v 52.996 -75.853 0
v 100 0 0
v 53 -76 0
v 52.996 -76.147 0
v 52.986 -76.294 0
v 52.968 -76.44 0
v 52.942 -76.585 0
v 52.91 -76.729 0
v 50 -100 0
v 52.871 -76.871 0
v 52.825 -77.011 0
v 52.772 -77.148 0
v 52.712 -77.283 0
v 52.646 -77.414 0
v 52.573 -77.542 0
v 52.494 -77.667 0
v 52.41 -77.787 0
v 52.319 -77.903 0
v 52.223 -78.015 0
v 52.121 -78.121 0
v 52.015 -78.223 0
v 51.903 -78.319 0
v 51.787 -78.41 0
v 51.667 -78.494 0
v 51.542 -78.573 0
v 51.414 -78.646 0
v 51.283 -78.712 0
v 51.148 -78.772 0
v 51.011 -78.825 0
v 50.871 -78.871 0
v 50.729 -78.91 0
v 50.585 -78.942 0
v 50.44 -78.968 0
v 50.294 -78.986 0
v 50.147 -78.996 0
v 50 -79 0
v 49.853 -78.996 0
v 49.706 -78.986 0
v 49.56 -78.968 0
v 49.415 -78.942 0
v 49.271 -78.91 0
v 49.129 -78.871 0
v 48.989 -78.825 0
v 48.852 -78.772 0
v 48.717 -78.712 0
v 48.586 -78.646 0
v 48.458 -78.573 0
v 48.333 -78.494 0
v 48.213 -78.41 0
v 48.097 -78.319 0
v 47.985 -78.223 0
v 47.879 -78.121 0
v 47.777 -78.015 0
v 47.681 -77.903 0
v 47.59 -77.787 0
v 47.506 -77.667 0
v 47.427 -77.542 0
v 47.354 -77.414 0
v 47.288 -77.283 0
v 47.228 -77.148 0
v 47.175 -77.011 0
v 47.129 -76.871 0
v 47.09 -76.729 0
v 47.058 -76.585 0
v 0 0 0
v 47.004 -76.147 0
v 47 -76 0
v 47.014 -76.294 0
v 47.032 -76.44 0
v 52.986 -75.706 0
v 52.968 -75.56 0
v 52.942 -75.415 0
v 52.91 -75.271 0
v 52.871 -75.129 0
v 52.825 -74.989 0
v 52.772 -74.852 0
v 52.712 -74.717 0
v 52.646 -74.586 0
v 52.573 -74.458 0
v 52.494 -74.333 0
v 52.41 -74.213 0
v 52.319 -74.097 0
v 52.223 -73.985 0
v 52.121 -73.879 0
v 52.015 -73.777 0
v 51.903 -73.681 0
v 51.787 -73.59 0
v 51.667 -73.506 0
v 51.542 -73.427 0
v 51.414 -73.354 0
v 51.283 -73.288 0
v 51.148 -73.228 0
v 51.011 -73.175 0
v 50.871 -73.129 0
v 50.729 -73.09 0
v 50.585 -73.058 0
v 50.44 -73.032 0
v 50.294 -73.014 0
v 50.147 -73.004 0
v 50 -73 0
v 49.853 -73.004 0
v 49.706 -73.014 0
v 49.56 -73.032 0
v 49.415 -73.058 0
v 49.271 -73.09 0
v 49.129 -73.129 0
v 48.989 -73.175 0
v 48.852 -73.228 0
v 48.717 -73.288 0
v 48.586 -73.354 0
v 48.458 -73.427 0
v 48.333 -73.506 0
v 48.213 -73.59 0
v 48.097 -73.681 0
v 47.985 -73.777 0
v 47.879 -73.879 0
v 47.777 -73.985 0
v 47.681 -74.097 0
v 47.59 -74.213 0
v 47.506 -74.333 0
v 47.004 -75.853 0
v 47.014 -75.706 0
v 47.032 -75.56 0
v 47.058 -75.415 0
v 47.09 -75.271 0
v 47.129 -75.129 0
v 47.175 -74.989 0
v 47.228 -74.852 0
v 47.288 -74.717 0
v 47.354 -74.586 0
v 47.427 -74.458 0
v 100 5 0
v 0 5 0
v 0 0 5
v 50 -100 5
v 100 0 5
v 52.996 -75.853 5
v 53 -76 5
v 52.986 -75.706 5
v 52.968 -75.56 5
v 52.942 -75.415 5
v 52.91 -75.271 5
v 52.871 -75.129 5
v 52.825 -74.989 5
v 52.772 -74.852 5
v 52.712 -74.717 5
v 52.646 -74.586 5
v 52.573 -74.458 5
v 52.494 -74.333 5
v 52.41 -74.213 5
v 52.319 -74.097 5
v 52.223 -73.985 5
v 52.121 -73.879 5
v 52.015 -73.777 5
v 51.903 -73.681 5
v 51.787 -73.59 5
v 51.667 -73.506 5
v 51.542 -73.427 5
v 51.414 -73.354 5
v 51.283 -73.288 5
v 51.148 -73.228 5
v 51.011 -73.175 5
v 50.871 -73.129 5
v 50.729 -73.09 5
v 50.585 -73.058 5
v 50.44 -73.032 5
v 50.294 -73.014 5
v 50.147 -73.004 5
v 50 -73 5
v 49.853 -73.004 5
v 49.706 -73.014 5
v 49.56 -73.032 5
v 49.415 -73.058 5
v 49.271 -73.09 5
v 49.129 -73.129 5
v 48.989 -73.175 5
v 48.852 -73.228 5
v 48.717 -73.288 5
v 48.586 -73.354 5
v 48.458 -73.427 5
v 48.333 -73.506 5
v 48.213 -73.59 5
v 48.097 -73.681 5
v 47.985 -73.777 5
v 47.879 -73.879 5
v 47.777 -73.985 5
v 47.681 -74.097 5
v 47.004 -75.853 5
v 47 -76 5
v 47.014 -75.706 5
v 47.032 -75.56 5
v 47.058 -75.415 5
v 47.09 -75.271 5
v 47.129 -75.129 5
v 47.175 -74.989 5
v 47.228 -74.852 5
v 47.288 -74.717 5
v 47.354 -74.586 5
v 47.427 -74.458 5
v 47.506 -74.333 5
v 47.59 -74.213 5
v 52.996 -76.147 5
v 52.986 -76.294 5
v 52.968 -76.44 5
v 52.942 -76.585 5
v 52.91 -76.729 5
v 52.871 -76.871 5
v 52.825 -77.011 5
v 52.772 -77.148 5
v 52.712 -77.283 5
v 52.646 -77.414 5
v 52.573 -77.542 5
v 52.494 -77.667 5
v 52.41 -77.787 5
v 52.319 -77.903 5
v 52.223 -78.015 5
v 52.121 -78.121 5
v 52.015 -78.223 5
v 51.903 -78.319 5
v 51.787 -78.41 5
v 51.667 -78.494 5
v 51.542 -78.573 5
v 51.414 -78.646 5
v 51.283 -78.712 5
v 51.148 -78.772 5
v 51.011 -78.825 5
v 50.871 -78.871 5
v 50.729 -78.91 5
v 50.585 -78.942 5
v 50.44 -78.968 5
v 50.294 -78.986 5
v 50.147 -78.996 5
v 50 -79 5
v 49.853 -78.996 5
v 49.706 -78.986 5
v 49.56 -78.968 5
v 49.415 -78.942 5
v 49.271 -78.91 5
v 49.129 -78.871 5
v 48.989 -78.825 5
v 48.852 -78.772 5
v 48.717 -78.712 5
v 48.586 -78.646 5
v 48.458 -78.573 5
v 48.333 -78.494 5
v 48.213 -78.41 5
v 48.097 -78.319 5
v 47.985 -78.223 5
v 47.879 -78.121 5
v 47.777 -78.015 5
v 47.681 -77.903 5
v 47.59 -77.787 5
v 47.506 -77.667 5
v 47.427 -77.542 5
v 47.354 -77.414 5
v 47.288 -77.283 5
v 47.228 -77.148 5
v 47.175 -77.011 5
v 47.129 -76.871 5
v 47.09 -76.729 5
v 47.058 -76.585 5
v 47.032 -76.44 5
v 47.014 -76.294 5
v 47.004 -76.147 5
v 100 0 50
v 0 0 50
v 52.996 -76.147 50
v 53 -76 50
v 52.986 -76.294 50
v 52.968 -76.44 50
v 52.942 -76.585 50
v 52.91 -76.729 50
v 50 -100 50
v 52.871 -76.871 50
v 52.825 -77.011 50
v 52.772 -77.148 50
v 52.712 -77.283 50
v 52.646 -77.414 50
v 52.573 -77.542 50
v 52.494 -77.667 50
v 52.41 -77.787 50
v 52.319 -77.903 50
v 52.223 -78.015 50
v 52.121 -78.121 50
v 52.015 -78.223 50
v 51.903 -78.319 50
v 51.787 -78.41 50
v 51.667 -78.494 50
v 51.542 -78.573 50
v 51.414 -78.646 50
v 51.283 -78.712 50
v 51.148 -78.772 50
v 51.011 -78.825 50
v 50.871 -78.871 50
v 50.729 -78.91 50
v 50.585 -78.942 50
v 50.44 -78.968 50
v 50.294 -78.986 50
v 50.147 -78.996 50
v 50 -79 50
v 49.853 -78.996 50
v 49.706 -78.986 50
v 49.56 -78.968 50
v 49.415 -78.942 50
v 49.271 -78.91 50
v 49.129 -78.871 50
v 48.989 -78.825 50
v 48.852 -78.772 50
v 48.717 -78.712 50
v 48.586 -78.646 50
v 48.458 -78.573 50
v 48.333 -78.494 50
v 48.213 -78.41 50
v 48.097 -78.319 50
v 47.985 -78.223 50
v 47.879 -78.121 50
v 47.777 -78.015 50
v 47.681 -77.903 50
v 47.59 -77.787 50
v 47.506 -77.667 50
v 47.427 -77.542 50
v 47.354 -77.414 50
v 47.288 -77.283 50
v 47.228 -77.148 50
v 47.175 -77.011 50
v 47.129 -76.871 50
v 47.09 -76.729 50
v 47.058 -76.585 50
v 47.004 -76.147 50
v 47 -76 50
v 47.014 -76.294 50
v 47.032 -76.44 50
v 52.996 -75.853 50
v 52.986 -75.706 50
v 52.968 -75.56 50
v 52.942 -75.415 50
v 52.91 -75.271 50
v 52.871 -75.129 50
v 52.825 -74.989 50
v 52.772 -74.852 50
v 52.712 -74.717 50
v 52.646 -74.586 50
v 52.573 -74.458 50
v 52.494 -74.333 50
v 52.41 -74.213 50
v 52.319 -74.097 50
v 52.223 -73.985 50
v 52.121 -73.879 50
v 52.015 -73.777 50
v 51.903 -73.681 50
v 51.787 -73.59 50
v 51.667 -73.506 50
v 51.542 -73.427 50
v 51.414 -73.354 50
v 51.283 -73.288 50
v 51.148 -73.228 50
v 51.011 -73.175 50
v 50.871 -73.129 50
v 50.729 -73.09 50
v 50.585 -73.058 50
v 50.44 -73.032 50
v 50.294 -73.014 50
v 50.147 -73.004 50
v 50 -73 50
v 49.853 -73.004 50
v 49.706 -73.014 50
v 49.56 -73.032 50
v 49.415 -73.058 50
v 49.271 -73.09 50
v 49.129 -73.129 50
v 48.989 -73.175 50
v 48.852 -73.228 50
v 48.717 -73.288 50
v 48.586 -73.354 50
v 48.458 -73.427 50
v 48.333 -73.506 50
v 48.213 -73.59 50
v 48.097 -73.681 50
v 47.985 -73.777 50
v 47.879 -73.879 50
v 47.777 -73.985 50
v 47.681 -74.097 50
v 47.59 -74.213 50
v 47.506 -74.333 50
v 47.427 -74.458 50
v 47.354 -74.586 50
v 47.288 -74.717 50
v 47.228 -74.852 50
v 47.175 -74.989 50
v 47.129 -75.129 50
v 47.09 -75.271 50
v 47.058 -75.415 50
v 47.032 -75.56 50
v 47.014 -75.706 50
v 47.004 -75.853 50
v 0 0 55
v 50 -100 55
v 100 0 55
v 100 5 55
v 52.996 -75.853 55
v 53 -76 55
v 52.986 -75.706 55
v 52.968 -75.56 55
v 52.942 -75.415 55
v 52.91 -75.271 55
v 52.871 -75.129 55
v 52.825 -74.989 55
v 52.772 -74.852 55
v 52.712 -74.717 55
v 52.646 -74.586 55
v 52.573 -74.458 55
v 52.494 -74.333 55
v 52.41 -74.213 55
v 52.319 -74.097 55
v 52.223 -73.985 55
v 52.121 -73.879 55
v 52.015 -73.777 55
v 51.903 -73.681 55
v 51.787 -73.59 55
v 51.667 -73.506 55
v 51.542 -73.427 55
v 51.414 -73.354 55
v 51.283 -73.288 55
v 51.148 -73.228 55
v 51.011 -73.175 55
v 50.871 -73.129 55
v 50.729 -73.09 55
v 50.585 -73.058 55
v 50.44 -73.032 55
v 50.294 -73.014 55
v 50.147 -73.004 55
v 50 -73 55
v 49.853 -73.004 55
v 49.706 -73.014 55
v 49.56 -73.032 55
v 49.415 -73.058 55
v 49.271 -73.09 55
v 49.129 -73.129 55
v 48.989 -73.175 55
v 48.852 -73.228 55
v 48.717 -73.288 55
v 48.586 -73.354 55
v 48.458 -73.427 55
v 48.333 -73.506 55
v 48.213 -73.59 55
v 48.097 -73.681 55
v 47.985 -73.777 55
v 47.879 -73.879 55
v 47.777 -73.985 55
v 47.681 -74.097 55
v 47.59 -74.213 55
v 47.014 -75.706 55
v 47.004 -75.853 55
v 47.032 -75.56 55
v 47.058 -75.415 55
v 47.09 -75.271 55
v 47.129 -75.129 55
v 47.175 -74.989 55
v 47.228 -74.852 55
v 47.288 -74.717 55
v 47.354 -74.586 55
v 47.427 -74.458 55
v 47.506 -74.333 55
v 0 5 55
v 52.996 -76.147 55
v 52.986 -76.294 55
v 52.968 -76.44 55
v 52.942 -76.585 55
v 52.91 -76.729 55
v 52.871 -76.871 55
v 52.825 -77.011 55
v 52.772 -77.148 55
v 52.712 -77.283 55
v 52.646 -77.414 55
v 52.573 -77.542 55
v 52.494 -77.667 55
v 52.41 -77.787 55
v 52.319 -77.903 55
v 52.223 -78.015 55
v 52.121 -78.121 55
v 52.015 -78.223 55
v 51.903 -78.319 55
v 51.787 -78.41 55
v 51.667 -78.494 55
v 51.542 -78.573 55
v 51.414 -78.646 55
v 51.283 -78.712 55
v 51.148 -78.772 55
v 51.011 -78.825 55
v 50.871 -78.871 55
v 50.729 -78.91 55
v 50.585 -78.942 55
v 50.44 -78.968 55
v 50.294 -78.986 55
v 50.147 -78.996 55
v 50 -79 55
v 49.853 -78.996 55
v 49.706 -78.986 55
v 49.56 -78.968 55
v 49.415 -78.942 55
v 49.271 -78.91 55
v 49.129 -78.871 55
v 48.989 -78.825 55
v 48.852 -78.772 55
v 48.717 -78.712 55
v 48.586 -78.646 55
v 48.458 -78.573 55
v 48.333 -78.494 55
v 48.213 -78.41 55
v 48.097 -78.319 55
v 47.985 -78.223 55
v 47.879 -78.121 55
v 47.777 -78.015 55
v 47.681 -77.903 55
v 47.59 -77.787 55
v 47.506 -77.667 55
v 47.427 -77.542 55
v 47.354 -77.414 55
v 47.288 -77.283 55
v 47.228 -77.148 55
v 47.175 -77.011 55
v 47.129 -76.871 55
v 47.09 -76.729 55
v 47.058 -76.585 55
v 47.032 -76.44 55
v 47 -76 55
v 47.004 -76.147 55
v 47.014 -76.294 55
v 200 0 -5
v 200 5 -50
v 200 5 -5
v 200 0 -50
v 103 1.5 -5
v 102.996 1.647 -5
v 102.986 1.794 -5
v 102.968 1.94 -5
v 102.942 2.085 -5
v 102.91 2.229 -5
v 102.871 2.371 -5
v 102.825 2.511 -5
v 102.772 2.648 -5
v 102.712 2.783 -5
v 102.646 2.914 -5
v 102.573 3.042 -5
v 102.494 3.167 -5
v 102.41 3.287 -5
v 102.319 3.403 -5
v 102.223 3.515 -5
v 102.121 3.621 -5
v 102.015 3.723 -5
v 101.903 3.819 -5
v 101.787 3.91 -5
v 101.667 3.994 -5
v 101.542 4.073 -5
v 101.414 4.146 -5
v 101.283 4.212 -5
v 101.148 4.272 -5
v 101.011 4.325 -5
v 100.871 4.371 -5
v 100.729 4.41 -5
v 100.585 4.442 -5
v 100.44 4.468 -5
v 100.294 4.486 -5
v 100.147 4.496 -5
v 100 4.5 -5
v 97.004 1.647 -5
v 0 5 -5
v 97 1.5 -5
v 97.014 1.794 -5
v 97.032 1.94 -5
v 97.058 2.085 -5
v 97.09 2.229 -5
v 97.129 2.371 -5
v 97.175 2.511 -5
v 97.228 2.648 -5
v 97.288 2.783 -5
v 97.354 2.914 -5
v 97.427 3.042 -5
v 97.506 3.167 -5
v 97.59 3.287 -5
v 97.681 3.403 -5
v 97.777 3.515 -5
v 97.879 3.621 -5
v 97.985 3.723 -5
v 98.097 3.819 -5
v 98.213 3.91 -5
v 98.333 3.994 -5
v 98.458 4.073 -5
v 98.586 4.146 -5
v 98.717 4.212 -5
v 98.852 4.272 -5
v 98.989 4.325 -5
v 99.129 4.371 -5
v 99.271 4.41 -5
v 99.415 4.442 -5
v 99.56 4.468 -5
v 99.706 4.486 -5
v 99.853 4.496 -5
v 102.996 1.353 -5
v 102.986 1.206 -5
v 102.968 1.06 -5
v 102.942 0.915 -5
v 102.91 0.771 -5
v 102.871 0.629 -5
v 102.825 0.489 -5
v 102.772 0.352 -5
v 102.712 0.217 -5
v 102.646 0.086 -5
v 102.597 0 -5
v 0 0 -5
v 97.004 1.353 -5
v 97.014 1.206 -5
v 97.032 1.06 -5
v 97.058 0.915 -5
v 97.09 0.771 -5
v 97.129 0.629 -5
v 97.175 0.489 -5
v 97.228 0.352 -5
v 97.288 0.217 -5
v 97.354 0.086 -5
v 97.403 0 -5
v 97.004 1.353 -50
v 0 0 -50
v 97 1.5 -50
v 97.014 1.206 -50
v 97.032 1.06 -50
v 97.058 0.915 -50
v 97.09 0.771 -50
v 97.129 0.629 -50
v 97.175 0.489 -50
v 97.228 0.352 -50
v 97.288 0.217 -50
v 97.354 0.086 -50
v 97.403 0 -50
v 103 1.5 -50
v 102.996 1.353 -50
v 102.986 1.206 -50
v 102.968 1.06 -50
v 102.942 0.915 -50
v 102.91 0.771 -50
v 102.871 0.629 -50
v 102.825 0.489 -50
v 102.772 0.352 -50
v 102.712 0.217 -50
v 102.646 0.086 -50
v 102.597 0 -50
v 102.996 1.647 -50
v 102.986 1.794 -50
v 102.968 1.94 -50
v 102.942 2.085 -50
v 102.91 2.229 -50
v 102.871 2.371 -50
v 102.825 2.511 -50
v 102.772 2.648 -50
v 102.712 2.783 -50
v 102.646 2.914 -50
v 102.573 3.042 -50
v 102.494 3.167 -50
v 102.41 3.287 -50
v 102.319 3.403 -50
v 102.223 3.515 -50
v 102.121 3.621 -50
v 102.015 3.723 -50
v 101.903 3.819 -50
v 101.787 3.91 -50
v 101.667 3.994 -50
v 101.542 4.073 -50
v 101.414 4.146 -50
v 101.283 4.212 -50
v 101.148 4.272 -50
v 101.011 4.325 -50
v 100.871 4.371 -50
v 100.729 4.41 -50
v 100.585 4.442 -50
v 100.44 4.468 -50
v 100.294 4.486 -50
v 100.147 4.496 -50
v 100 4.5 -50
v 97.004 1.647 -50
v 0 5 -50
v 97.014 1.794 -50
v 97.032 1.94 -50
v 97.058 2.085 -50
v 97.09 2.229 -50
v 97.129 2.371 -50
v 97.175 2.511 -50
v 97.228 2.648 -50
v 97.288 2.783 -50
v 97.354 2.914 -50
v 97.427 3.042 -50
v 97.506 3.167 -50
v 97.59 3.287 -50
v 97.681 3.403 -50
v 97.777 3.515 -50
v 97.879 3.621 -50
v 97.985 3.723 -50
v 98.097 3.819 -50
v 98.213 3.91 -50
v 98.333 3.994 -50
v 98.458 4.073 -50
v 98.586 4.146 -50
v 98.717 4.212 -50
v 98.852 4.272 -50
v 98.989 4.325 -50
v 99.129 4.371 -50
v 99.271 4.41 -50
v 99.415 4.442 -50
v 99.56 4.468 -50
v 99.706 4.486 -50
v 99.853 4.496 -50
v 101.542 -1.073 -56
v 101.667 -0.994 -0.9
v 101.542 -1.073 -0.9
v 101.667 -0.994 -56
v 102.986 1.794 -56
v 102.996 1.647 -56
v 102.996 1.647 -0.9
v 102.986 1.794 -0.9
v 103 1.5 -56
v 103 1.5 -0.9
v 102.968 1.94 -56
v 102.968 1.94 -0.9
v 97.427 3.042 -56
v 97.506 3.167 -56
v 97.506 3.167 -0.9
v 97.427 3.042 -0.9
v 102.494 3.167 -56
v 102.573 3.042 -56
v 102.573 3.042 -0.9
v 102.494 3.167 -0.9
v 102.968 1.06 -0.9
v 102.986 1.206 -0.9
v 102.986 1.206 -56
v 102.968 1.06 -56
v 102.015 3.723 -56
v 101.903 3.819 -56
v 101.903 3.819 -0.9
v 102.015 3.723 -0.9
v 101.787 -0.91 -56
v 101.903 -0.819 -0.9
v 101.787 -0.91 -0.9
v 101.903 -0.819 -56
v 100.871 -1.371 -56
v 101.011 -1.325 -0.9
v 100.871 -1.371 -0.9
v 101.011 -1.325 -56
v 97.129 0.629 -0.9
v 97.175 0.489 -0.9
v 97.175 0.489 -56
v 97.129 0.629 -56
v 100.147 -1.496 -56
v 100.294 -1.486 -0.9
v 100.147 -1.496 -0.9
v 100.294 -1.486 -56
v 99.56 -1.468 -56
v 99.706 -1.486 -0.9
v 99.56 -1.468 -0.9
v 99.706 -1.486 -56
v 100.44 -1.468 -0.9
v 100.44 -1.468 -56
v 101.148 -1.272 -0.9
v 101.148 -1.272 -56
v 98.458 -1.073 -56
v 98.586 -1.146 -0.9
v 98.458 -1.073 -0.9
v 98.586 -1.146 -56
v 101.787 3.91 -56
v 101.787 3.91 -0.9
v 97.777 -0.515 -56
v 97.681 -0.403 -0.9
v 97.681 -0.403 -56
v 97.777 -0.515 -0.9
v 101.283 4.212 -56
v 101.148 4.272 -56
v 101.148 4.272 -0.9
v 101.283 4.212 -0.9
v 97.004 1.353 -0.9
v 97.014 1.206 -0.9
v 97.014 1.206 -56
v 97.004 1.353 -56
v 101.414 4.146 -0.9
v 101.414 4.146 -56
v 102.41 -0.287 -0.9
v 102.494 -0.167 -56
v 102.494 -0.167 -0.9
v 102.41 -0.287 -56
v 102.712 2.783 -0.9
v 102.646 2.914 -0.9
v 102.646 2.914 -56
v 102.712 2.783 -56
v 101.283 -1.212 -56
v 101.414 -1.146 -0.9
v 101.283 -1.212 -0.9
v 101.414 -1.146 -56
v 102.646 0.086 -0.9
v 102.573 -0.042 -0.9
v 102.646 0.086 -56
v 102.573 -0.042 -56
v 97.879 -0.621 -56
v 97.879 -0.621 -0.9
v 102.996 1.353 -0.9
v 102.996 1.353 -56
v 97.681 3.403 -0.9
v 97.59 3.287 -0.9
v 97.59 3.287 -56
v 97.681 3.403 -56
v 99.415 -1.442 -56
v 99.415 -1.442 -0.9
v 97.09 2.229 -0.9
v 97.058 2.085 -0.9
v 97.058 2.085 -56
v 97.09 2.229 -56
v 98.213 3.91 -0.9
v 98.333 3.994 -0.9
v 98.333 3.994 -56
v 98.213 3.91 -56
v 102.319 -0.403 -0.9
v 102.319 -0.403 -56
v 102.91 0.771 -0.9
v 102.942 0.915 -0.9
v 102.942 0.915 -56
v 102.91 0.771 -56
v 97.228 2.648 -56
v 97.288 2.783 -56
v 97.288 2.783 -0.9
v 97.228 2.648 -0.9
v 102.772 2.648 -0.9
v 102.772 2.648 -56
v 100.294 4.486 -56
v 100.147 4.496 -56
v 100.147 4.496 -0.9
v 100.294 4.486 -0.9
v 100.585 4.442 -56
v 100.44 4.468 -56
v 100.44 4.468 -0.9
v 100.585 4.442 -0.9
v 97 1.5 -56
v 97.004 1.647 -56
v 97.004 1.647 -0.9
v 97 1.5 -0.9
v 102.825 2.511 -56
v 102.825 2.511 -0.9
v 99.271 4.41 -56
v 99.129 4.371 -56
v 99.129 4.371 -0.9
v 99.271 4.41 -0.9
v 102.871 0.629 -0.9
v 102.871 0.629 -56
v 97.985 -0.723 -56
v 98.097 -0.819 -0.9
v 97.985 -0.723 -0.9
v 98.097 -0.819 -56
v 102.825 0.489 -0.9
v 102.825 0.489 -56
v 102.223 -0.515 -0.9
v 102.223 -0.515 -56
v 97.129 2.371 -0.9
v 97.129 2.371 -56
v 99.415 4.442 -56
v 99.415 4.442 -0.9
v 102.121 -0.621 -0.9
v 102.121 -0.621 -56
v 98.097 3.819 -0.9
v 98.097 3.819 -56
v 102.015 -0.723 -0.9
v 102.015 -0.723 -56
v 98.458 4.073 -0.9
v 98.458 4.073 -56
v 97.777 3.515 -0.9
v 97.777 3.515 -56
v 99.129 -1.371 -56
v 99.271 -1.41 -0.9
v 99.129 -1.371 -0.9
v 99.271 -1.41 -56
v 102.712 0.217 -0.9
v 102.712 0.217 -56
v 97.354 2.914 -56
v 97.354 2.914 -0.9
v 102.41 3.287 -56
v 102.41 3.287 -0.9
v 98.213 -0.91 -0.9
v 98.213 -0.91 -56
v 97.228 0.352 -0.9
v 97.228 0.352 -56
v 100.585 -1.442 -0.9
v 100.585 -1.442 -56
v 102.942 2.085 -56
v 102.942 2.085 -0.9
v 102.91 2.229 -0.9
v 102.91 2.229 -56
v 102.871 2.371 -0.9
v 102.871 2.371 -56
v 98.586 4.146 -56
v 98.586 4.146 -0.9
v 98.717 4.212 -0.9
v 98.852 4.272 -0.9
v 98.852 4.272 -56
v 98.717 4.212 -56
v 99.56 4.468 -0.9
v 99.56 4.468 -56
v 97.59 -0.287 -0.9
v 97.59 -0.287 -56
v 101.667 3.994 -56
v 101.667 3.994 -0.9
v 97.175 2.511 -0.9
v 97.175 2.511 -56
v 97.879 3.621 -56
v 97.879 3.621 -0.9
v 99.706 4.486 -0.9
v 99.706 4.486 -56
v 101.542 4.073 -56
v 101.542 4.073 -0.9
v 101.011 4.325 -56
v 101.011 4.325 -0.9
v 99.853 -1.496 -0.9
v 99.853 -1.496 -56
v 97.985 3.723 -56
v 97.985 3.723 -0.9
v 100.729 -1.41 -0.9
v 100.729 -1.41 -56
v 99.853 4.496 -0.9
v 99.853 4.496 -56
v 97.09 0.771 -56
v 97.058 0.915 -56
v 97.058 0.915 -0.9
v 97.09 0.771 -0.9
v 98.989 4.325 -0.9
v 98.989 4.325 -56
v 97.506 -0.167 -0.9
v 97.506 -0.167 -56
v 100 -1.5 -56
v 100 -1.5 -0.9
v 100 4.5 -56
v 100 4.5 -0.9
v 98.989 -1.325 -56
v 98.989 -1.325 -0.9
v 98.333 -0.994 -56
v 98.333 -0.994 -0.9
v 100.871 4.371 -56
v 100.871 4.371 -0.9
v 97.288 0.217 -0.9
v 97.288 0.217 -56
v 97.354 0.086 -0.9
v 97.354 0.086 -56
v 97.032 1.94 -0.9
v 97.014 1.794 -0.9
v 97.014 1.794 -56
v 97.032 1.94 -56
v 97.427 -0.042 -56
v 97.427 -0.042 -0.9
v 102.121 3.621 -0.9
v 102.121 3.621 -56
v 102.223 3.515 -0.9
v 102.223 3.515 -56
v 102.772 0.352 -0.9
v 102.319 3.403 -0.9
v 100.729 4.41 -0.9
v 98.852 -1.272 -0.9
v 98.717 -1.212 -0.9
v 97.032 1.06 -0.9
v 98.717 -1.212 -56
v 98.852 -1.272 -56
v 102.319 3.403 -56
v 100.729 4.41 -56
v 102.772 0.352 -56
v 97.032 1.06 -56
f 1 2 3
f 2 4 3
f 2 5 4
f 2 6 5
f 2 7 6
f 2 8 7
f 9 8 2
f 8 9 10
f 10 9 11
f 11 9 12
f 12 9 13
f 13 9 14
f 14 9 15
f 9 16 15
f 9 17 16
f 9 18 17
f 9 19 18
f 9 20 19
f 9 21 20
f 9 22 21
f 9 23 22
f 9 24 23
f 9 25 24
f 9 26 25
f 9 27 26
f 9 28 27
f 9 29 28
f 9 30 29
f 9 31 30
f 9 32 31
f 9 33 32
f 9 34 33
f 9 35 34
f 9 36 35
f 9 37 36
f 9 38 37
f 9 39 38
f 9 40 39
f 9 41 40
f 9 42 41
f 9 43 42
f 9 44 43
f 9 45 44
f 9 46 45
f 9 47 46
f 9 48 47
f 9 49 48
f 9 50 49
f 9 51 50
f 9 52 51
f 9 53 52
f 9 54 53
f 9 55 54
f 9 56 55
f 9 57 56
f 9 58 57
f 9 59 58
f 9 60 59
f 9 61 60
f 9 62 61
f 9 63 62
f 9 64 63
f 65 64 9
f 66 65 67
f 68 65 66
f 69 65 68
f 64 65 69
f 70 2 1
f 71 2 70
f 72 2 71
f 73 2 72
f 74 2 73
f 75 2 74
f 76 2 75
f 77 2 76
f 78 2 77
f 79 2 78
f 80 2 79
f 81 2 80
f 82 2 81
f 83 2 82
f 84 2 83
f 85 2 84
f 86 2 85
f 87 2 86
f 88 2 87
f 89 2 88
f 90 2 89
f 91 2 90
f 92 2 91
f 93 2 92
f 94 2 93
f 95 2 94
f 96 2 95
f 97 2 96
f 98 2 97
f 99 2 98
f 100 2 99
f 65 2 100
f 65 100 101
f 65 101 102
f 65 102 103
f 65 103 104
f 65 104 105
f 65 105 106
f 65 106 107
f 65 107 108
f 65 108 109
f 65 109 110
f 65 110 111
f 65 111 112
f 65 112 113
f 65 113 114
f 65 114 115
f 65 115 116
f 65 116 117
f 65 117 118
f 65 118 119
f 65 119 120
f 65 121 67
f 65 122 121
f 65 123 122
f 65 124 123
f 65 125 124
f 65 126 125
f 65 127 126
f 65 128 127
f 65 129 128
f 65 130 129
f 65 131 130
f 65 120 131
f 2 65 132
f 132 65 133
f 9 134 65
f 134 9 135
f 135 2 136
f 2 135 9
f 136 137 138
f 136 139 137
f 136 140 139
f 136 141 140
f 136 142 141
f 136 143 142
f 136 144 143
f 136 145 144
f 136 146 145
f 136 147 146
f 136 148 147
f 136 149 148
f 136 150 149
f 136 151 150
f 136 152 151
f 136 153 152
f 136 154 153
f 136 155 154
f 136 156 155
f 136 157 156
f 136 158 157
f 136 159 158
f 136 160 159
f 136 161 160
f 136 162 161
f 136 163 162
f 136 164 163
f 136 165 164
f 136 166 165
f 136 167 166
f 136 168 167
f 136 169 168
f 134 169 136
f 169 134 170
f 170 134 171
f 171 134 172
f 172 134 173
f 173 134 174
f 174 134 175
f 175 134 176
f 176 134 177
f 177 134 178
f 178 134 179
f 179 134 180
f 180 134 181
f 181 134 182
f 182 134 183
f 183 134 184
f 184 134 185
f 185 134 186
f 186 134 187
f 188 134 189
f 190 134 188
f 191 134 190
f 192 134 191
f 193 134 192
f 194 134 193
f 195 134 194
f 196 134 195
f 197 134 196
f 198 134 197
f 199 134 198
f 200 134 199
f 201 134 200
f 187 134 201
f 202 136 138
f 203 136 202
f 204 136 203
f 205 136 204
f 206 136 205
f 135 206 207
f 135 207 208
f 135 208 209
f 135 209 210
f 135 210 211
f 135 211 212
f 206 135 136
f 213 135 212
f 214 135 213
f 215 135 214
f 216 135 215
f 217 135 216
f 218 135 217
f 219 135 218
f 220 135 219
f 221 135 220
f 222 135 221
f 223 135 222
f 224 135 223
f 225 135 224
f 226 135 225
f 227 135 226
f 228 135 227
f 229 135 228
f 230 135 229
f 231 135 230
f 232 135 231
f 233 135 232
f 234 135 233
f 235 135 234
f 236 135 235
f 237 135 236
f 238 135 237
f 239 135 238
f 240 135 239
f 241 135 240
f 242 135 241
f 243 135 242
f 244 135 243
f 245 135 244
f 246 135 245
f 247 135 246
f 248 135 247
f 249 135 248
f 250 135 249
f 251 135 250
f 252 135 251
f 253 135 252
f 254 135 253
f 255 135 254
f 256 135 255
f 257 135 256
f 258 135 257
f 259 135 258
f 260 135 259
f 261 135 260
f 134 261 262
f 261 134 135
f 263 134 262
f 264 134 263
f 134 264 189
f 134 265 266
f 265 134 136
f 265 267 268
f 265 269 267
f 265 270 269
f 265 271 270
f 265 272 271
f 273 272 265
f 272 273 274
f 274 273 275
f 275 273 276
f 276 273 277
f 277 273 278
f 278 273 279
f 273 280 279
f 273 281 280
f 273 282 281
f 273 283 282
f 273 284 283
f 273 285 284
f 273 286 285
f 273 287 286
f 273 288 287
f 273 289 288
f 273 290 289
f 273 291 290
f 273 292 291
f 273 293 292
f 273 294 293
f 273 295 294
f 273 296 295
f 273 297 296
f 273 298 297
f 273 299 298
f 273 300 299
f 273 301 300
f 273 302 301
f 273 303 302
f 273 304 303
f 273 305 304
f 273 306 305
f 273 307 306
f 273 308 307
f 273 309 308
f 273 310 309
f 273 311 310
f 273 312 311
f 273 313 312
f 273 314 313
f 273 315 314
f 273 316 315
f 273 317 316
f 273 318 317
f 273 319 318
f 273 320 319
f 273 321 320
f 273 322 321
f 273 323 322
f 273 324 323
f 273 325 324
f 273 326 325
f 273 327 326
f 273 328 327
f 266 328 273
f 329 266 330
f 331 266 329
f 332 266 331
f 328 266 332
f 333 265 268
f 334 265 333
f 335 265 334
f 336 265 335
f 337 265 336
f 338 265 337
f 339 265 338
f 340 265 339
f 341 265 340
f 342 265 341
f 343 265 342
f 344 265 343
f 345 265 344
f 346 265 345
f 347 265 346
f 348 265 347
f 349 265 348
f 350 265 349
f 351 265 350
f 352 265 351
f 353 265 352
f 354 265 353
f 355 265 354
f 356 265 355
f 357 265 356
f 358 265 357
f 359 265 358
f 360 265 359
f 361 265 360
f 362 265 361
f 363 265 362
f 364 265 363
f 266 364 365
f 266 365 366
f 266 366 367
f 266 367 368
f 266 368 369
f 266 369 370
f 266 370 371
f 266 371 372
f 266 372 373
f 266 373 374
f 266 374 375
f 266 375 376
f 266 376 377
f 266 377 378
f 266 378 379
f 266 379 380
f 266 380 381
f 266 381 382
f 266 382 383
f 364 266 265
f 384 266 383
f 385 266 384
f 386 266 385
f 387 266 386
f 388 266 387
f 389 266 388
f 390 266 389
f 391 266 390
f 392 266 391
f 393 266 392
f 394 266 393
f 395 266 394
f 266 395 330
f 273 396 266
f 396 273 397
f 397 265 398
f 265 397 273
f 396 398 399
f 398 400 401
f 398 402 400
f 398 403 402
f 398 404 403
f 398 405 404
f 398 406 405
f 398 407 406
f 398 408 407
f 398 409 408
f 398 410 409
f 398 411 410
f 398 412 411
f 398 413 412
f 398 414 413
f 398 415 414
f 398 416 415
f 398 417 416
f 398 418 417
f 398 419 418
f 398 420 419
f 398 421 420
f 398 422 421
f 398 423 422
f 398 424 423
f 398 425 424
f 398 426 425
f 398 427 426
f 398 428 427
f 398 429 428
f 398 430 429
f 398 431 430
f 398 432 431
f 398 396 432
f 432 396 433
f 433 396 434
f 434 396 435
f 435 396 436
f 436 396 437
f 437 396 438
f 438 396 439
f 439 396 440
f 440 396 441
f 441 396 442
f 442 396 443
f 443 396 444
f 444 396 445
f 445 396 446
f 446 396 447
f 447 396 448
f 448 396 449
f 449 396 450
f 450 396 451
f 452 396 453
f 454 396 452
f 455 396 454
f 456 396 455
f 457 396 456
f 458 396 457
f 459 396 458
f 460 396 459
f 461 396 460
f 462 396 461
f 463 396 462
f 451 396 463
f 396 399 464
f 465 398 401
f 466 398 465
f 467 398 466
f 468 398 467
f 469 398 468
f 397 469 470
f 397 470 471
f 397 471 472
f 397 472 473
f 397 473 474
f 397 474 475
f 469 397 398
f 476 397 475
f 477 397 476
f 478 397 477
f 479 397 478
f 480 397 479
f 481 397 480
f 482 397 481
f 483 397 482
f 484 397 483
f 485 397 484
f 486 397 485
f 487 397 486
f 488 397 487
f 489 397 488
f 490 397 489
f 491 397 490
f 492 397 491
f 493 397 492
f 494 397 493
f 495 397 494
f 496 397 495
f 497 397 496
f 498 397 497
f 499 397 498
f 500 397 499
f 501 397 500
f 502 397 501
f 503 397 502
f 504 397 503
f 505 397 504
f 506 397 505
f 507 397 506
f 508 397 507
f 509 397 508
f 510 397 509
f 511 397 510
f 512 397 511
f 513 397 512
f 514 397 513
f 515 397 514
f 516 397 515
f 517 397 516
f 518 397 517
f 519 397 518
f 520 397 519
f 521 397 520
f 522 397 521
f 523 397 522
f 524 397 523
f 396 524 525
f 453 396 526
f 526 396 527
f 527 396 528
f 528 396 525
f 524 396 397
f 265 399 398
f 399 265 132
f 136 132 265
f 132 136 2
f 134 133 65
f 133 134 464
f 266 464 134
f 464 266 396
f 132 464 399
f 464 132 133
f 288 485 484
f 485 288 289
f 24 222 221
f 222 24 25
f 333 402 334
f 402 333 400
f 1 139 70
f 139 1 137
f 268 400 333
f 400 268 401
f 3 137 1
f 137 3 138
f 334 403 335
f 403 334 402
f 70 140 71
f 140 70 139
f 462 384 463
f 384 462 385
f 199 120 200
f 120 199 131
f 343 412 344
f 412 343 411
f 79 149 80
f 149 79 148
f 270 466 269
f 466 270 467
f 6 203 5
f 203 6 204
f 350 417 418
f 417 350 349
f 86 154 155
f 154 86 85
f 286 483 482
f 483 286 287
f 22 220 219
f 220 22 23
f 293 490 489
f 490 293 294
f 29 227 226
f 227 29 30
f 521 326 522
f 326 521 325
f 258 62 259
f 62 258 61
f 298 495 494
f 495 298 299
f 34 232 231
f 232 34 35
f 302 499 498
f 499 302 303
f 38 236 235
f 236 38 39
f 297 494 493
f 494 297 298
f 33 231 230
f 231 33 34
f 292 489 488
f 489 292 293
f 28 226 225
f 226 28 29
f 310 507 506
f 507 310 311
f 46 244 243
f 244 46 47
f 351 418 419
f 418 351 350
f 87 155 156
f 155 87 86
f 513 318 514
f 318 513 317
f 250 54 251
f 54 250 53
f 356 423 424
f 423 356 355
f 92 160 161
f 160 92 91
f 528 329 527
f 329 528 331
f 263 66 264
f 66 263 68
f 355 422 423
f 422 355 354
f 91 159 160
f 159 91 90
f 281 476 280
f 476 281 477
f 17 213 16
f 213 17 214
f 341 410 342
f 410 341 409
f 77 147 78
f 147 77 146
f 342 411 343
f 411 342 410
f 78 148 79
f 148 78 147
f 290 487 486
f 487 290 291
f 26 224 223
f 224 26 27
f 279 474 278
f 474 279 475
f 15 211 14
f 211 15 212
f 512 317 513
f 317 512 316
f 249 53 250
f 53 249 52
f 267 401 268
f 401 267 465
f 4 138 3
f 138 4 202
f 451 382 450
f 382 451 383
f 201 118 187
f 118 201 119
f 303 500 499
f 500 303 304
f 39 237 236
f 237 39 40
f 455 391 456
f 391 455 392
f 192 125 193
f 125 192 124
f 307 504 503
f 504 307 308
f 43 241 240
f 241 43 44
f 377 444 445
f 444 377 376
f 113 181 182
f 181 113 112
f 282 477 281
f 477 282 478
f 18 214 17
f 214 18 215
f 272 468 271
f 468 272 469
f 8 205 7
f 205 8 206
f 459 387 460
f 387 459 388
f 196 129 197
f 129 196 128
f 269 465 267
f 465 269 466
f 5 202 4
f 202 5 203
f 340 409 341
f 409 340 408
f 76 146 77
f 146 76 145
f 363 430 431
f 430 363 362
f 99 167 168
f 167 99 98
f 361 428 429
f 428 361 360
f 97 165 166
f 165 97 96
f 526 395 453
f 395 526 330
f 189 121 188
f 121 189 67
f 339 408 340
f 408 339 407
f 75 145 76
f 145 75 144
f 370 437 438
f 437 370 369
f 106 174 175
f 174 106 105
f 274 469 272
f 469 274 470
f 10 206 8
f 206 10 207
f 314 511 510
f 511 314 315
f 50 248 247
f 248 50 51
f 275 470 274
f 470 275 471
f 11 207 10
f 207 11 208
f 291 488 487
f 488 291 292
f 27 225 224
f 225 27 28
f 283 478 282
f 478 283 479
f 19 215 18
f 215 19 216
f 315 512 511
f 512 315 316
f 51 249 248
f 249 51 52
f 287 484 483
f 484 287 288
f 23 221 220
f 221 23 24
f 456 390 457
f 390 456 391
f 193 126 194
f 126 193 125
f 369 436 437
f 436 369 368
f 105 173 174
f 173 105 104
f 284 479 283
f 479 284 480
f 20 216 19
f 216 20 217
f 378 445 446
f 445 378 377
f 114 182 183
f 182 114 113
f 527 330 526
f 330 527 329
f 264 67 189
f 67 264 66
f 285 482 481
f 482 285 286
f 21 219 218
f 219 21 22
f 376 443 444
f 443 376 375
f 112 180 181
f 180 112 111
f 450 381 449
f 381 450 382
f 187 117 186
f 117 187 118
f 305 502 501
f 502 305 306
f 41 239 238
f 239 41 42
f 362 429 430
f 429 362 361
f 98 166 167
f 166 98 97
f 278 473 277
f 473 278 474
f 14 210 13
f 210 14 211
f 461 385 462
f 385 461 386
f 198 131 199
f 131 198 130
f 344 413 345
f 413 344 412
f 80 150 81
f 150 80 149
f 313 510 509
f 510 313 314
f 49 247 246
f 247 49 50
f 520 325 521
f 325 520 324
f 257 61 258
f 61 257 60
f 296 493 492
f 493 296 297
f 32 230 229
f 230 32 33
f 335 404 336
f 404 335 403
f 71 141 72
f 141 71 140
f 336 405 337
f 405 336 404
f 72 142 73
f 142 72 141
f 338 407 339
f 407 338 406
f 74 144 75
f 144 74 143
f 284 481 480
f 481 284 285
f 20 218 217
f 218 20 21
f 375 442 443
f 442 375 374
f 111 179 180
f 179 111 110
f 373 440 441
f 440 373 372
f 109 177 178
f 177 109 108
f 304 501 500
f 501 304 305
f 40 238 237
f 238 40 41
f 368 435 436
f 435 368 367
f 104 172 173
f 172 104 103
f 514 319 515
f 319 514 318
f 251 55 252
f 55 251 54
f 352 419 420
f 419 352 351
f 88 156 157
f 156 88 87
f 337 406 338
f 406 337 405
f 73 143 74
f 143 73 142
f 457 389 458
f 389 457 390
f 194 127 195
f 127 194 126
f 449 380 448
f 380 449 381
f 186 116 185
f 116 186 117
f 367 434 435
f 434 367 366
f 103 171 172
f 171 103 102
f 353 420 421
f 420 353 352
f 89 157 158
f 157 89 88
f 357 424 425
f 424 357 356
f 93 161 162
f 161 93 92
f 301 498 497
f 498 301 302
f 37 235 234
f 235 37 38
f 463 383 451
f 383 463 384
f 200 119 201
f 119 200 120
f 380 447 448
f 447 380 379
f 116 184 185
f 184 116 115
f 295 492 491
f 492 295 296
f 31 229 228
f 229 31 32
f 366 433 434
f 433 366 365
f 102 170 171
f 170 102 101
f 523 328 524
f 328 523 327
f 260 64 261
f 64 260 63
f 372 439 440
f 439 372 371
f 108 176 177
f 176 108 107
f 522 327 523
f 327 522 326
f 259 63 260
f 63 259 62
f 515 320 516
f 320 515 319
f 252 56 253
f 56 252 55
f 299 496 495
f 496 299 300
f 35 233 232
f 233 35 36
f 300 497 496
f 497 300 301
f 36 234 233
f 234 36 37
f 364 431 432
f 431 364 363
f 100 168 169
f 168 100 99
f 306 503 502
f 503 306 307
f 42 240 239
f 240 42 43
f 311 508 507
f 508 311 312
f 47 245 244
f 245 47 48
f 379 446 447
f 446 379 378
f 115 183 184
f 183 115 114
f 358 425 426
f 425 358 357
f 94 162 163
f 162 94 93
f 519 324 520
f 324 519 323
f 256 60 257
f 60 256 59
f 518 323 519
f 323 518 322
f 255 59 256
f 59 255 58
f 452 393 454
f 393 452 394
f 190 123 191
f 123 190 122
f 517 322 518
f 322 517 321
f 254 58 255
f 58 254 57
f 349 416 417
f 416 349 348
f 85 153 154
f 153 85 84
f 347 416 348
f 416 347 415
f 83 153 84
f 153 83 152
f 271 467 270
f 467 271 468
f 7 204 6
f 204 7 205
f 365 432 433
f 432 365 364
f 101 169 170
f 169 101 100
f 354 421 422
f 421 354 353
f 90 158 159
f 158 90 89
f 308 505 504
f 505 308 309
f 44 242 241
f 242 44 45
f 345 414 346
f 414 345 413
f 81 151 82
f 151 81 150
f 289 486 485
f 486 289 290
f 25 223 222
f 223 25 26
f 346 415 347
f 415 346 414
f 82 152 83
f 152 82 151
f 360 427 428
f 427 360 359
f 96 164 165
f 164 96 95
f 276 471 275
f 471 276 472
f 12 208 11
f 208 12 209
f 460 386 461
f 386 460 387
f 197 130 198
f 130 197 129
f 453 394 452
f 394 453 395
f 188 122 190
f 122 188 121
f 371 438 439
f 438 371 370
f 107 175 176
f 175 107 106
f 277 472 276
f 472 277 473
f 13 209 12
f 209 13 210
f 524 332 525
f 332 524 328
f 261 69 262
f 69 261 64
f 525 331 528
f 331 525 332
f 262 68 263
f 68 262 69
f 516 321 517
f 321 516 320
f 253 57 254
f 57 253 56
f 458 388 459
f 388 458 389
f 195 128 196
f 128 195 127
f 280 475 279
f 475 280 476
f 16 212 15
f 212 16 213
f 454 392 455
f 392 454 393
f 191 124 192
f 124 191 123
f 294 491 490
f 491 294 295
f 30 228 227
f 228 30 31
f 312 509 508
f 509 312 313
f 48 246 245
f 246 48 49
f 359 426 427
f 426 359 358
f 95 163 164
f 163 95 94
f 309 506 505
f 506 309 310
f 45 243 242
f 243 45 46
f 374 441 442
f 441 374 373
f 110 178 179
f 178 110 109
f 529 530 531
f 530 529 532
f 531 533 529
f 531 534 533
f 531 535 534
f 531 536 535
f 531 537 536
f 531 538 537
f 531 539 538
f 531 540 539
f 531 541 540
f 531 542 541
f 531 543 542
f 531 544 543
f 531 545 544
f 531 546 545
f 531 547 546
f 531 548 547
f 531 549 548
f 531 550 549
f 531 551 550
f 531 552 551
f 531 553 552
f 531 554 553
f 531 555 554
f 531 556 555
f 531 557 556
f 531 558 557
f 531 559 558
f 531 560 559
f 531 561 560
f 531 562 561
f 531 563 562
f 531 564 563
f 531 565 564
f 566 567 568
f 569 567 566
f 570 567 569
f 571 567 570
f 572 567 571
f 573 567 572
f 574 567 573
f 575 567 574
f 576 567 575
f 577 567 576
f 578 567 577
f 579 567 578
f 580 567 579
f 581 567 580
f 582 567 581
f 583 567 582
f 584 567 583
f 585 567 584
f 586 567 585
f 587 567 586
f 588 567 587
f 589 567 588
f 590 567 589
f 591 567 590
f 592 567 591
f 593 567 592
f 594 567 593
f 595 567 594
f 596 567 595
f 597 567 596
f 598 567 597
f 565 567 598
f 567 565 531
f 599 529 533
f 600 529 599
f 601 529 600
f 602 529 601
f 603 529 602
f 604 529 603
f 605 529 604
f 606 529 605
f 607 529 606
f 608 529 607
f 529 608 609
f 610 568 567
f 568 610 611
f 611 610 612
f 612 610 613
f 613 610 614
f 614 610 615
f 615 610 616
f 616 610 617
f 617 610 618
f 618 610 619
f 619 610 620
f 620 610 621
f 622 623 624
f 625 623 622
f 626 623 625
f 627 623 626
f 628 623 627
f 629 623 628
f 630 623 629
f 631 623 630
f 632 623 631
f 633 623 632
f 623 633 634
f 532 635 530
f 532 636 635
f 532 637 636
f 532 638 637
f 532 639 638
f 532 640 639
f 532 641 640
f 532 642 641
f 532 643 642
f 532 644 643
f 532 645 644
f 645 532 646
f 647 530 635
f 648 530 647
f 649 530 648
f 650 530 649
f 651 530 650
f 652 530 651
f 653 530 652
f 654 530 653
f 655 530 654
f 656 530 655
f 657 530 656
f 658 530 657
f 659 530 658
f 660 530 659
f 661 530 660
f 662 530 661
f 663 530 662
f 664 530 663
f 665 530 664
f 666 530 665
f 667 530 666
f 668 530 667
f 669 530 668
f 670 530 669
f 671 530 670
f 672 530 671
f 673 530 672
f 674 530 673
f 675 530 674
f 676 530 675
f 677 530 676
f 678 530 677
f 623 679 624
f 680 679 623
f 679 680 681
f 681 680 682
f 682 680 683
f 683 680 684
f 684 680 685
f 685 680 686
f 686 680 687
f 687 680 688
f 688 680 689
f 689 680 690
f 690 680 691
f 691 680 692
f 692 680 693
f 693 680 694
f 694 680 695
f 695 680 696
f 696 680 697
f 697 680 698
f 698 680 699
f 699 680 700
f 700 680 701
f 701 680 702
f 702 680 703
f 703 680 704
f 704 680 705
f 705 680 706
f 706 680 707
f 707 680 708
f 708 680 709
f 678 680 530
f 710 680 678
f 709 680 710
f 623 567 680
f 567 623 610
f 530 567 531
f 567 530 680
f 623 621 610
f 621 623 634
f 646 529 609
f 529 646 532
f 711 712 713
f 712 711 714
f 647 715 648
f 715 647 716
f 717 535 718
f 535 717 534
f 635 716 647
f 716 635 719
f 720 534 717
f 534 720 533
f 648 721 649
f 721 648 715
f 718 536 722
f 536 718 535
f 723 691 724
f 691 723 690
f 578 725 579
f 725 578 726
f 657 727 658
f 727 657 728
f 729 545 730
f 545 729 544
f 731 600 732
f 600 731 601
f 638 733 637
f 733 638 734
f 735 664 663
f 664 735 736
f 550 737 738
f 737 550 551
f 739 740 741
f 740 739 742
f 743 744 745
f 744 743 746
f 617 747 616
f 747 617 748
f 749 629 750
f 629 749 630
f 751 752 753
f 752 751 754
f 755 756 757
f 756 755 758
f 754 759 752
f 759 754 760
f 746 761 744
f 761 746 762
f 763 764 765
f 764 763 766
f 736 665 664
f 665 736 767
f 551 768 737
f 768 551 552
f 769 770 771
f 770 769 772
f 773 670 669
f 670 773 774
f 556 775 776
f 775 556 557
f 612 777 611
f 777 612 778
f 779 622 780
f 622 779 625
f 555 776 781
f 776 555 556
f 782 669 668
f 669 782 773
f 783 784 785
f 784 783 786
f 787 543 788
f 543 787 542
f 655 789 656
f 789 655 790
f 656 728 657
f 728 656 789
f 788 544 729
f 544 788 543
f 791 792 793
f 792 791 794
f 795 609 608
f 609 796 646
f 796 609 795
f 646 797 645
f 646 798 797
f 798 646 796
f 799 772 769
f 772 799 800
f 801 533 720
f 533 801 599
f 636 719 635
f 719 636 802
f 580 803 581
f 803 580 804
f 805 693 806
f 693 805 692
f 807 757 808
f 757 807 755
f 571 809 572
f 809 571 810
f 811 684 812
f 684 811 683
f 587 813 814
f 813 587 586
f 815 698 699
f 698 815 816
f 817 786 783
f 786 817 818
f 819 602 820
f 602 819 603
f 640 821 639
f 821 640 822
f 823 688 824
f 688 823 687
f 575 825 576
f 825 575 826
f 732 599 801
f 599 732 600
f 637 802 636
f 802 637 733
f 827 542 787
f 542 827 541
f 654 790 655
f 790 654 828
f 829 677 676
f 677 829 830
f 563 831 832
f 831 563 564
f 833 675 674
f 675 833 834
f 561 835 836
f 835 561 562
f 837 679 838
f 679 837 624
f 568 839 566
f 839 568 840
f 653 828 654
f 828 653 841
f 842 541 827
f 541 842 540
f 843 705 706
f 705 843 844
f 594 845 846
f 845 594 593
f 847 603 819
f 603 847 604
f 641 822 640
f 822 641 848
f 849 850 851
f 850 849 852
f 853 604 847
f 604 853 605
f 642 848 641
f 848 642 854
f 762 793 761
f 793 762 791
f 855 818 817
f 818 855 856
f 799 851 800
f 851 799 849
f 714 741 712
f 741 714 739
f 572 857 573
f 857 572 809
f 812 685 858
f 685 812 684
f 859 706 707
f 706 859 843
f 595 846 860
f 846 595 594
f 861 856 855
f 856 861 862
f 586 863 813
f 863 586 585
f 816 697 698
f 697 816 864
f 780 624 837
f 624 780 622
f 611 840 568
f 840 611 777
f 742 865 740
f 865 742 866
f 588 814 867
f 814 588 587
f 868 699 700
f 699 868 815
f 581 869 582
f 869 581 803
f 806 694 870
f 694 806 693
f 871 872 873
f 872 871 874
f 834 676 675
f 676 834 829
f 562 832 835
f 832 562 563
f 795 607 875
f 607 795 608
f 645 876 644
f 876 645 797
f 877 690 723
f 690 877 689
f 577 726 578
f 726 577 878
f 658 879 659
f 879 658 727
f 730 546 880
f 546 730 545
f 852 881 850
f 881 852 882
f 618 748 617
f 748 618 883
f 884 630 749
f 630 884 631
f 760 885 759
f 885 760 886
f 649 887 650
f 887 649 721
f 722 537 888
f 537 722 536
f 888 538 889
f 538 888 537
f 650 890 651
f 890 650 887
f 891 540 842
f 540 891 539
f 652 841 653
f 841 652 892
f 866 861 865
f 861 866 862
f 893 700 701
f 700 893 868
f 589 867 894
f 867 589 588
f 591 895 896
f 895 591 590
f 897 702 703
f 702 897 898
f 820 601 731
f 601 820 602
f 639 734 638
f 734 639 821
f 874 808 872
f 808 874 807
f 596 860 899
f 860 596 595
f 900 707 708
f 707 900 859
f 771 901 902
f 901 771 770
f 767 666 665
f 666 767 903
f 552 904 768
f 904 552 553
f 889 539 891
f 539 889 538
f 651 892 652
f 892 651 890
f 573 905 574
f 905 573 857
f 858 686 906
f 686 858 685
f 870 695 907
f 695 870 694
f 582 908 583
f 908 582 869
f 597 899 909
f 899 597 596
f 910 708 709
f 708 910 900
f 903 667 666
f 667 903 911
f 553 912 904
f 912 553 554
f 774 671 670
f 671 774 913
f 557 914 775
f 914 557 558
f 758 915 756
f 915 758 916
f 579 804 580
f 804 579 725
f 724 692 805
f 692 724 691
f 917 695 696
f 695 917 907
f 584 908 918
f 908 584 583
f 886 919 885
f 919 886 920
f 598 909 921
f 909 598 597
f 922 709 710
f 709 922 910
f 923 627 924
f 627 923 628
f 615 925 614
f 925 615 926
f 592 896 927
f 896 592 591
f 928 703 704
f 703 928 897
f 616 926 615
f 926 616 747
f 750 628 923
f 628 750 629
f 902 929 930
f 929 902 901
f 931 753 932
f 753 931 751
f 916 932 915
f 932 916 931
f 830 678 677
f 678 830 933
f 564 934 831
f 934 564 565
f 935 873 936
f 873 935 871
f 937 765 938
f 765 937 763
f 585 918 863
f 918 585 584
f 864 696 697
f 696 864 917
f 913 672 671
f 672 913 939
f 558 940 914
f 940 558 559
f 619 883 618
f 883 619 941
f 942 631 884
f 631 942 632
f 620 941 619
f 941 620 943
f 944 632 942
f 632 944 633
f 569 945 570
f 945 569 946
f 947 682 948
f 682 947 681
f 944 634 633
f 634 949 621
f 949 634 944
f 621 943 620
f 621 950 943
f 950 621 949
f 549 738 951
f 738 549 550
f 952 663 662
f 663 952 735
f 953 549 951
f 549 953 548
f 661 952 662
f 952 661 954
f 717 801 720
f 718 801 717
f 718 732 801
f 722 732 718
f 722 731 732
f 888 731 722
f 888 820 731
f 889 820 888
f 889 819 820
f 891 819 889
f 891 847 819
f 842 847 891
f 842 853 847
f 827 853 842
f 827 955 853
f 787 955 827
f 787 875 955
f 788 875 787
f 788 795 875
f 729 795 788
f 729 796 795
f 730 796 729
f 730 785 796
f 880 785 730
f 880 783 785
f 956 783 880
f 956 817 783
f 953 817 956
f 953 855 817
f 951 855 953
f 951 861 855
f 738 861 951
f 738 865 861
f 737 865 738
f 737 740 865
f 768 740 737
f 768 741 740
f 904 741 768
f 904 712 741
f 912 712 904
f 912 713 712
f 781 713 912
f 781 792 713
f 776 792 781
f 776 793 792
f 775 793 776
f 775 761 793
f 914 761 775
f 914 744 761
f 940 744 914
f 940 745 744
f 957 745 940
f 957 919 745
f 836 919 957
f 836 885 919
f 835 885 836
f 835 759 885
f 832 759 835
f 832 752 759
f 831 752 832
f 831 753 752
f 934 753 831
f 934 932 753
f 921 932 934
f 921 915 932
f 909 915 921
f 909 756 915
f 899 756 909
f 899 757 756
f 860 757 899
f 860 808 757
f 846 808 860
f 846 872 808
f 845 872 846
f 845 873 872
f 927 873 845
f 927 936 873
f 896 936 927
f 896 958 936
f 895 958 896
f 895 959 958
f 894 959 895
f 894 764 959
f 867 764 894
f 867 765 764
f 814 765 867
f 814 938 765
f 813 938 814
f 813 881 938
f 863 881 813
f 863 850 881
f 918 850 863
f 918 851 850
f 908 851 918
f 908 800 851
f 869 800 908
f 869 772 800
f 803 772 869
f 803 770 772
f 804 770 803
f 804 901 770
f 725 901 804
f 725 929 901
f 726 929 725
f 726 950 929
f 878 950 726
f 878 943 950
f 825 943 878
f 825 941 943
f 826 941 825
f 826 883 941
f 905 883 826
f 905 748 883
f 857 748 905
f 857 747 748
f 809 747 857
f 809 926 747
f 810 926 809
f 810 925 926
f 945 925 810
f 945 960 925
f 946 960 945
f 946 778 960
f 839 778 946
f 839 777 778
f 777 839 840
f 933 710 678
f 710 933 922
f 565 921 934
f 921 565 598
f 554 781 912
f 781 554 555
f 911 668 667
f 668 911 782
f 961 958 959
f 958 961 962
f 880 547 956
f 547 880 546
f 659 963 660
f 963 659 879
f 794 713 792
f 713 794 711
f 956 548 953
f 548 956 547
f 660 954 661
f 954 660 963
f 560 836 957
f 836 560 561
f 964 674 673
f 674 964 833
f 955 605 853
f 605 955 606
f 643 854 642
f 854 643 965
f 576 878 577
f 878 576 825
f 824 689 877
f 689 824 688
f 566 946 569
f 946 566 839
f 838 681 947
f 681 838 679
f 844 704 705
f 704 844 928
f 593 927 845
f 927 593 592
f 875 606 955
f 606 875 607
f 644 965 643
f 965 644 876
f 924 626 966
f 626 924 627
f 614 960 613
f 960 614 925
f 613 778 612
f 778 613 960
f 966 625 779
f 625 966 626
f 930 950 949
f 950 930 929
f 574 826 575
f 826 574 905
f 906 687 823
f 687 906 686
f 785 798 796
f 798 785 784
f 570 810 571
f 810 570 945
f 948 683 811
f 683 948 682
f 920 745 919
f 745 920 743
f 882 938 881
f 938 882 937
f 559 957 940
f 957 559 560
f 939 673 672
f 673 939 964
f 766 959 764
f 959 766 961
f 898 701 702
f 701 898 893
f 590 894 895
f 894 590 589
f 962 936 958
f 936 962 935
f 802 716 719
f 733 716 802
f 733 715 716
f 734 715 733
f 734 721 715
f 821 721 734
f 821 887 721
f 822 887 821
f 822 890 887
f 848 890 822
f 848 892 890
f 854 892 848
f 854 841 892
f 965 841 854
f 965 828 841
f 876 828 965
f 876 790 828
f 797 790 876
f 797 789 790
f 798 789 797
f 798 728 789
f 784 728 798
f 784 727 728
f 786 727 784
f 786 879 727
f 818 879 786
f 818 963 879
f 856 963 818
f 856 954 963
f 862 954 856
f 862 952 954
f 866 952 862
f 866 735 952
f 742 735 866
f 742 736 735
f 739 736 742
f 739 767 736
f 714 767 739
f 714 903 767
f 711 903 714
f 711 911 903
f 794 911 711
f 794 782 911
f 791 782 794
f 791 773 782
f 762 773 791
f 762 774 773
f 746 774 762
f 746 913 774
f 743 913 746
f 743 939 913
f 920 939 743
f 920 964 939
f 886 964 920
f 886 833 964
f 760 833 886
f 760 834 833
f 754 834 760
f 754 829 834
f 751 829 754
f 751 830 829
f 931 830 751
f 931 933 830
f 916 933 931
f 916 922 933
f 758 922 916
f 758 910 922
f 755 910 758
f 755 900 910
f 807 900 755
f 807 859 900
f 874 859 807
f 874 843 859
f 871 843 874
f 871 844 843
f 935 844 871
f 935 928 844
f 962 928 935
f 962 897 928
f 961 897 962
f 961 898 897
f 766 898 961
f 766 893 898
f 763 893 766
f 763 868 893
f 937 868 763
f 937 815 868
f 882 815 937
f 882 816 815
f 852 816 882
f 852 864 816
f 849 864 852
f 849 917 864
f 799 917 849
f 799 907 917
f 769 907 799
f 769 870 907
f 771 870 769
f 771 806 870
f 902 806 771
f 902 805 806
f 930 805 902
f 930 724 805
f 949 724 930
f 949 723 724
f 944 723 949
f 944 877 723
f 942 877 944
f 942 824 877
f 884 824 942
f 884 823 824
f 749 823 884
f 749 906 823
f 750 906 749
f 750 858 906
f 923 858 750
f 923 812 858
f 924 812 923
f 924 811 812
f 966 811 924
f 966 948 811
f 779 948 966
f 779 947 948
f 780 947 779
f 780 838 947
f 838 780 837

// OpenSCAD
dreieck_hoehe  = 100;
dreieck_breite = 100;
dreieck_abstand = 50;
dreieck_dicke = 5;
dreieck_halterung = 3;
wippe_laenge = 200;
$fn = 128;

module Dreieck(hoehe, breite, tiefe)
{
    points2 = [
        [0, 0],             // Punkt A (0, 0)
        [breite/2, -hoehe], // Punkt B (10, 0)
        [breite, 0]         // Punkt C (5, 8.66)
    ];

    // Dreieck extrudieren
    linear_extrude(tiefe) {
        polygon(points2);
    }
}

difference() {
    union(){
        Dreieck(dreieck_hoehe,dreieck_breite,dreieck_dicke);
        translate([0,0,dreieck_abstand])
            Dreieck(dreieck_hoehe,dreieck_breite,dreieck_dicke);
        cube([dreieck_breite,dreieck_dicke,dreieck_abstand+dreieck_dicke]);
    }
    translate([dreieck_breite/2,-dreieck_hoehe+8*dreieck_halterung,-.1])
        cylinder(r=dreieck_halterung, h=dreieck_abstand+dreieck_dicke+.1);            
}

translate([0,0,-dreieck_abstand])
    cube([wippe_laenge,dreieck_dicke,dreieck_abstand-dreieck_dicke]);
translate([wippe_laenge/2,dreieck_halterung/2,-dreieck_abstand-dreieck_dicke-1])
    cylinder(r=dreieck_halterung, h=dreieck_abstand+dreieck_dicke+.1);
